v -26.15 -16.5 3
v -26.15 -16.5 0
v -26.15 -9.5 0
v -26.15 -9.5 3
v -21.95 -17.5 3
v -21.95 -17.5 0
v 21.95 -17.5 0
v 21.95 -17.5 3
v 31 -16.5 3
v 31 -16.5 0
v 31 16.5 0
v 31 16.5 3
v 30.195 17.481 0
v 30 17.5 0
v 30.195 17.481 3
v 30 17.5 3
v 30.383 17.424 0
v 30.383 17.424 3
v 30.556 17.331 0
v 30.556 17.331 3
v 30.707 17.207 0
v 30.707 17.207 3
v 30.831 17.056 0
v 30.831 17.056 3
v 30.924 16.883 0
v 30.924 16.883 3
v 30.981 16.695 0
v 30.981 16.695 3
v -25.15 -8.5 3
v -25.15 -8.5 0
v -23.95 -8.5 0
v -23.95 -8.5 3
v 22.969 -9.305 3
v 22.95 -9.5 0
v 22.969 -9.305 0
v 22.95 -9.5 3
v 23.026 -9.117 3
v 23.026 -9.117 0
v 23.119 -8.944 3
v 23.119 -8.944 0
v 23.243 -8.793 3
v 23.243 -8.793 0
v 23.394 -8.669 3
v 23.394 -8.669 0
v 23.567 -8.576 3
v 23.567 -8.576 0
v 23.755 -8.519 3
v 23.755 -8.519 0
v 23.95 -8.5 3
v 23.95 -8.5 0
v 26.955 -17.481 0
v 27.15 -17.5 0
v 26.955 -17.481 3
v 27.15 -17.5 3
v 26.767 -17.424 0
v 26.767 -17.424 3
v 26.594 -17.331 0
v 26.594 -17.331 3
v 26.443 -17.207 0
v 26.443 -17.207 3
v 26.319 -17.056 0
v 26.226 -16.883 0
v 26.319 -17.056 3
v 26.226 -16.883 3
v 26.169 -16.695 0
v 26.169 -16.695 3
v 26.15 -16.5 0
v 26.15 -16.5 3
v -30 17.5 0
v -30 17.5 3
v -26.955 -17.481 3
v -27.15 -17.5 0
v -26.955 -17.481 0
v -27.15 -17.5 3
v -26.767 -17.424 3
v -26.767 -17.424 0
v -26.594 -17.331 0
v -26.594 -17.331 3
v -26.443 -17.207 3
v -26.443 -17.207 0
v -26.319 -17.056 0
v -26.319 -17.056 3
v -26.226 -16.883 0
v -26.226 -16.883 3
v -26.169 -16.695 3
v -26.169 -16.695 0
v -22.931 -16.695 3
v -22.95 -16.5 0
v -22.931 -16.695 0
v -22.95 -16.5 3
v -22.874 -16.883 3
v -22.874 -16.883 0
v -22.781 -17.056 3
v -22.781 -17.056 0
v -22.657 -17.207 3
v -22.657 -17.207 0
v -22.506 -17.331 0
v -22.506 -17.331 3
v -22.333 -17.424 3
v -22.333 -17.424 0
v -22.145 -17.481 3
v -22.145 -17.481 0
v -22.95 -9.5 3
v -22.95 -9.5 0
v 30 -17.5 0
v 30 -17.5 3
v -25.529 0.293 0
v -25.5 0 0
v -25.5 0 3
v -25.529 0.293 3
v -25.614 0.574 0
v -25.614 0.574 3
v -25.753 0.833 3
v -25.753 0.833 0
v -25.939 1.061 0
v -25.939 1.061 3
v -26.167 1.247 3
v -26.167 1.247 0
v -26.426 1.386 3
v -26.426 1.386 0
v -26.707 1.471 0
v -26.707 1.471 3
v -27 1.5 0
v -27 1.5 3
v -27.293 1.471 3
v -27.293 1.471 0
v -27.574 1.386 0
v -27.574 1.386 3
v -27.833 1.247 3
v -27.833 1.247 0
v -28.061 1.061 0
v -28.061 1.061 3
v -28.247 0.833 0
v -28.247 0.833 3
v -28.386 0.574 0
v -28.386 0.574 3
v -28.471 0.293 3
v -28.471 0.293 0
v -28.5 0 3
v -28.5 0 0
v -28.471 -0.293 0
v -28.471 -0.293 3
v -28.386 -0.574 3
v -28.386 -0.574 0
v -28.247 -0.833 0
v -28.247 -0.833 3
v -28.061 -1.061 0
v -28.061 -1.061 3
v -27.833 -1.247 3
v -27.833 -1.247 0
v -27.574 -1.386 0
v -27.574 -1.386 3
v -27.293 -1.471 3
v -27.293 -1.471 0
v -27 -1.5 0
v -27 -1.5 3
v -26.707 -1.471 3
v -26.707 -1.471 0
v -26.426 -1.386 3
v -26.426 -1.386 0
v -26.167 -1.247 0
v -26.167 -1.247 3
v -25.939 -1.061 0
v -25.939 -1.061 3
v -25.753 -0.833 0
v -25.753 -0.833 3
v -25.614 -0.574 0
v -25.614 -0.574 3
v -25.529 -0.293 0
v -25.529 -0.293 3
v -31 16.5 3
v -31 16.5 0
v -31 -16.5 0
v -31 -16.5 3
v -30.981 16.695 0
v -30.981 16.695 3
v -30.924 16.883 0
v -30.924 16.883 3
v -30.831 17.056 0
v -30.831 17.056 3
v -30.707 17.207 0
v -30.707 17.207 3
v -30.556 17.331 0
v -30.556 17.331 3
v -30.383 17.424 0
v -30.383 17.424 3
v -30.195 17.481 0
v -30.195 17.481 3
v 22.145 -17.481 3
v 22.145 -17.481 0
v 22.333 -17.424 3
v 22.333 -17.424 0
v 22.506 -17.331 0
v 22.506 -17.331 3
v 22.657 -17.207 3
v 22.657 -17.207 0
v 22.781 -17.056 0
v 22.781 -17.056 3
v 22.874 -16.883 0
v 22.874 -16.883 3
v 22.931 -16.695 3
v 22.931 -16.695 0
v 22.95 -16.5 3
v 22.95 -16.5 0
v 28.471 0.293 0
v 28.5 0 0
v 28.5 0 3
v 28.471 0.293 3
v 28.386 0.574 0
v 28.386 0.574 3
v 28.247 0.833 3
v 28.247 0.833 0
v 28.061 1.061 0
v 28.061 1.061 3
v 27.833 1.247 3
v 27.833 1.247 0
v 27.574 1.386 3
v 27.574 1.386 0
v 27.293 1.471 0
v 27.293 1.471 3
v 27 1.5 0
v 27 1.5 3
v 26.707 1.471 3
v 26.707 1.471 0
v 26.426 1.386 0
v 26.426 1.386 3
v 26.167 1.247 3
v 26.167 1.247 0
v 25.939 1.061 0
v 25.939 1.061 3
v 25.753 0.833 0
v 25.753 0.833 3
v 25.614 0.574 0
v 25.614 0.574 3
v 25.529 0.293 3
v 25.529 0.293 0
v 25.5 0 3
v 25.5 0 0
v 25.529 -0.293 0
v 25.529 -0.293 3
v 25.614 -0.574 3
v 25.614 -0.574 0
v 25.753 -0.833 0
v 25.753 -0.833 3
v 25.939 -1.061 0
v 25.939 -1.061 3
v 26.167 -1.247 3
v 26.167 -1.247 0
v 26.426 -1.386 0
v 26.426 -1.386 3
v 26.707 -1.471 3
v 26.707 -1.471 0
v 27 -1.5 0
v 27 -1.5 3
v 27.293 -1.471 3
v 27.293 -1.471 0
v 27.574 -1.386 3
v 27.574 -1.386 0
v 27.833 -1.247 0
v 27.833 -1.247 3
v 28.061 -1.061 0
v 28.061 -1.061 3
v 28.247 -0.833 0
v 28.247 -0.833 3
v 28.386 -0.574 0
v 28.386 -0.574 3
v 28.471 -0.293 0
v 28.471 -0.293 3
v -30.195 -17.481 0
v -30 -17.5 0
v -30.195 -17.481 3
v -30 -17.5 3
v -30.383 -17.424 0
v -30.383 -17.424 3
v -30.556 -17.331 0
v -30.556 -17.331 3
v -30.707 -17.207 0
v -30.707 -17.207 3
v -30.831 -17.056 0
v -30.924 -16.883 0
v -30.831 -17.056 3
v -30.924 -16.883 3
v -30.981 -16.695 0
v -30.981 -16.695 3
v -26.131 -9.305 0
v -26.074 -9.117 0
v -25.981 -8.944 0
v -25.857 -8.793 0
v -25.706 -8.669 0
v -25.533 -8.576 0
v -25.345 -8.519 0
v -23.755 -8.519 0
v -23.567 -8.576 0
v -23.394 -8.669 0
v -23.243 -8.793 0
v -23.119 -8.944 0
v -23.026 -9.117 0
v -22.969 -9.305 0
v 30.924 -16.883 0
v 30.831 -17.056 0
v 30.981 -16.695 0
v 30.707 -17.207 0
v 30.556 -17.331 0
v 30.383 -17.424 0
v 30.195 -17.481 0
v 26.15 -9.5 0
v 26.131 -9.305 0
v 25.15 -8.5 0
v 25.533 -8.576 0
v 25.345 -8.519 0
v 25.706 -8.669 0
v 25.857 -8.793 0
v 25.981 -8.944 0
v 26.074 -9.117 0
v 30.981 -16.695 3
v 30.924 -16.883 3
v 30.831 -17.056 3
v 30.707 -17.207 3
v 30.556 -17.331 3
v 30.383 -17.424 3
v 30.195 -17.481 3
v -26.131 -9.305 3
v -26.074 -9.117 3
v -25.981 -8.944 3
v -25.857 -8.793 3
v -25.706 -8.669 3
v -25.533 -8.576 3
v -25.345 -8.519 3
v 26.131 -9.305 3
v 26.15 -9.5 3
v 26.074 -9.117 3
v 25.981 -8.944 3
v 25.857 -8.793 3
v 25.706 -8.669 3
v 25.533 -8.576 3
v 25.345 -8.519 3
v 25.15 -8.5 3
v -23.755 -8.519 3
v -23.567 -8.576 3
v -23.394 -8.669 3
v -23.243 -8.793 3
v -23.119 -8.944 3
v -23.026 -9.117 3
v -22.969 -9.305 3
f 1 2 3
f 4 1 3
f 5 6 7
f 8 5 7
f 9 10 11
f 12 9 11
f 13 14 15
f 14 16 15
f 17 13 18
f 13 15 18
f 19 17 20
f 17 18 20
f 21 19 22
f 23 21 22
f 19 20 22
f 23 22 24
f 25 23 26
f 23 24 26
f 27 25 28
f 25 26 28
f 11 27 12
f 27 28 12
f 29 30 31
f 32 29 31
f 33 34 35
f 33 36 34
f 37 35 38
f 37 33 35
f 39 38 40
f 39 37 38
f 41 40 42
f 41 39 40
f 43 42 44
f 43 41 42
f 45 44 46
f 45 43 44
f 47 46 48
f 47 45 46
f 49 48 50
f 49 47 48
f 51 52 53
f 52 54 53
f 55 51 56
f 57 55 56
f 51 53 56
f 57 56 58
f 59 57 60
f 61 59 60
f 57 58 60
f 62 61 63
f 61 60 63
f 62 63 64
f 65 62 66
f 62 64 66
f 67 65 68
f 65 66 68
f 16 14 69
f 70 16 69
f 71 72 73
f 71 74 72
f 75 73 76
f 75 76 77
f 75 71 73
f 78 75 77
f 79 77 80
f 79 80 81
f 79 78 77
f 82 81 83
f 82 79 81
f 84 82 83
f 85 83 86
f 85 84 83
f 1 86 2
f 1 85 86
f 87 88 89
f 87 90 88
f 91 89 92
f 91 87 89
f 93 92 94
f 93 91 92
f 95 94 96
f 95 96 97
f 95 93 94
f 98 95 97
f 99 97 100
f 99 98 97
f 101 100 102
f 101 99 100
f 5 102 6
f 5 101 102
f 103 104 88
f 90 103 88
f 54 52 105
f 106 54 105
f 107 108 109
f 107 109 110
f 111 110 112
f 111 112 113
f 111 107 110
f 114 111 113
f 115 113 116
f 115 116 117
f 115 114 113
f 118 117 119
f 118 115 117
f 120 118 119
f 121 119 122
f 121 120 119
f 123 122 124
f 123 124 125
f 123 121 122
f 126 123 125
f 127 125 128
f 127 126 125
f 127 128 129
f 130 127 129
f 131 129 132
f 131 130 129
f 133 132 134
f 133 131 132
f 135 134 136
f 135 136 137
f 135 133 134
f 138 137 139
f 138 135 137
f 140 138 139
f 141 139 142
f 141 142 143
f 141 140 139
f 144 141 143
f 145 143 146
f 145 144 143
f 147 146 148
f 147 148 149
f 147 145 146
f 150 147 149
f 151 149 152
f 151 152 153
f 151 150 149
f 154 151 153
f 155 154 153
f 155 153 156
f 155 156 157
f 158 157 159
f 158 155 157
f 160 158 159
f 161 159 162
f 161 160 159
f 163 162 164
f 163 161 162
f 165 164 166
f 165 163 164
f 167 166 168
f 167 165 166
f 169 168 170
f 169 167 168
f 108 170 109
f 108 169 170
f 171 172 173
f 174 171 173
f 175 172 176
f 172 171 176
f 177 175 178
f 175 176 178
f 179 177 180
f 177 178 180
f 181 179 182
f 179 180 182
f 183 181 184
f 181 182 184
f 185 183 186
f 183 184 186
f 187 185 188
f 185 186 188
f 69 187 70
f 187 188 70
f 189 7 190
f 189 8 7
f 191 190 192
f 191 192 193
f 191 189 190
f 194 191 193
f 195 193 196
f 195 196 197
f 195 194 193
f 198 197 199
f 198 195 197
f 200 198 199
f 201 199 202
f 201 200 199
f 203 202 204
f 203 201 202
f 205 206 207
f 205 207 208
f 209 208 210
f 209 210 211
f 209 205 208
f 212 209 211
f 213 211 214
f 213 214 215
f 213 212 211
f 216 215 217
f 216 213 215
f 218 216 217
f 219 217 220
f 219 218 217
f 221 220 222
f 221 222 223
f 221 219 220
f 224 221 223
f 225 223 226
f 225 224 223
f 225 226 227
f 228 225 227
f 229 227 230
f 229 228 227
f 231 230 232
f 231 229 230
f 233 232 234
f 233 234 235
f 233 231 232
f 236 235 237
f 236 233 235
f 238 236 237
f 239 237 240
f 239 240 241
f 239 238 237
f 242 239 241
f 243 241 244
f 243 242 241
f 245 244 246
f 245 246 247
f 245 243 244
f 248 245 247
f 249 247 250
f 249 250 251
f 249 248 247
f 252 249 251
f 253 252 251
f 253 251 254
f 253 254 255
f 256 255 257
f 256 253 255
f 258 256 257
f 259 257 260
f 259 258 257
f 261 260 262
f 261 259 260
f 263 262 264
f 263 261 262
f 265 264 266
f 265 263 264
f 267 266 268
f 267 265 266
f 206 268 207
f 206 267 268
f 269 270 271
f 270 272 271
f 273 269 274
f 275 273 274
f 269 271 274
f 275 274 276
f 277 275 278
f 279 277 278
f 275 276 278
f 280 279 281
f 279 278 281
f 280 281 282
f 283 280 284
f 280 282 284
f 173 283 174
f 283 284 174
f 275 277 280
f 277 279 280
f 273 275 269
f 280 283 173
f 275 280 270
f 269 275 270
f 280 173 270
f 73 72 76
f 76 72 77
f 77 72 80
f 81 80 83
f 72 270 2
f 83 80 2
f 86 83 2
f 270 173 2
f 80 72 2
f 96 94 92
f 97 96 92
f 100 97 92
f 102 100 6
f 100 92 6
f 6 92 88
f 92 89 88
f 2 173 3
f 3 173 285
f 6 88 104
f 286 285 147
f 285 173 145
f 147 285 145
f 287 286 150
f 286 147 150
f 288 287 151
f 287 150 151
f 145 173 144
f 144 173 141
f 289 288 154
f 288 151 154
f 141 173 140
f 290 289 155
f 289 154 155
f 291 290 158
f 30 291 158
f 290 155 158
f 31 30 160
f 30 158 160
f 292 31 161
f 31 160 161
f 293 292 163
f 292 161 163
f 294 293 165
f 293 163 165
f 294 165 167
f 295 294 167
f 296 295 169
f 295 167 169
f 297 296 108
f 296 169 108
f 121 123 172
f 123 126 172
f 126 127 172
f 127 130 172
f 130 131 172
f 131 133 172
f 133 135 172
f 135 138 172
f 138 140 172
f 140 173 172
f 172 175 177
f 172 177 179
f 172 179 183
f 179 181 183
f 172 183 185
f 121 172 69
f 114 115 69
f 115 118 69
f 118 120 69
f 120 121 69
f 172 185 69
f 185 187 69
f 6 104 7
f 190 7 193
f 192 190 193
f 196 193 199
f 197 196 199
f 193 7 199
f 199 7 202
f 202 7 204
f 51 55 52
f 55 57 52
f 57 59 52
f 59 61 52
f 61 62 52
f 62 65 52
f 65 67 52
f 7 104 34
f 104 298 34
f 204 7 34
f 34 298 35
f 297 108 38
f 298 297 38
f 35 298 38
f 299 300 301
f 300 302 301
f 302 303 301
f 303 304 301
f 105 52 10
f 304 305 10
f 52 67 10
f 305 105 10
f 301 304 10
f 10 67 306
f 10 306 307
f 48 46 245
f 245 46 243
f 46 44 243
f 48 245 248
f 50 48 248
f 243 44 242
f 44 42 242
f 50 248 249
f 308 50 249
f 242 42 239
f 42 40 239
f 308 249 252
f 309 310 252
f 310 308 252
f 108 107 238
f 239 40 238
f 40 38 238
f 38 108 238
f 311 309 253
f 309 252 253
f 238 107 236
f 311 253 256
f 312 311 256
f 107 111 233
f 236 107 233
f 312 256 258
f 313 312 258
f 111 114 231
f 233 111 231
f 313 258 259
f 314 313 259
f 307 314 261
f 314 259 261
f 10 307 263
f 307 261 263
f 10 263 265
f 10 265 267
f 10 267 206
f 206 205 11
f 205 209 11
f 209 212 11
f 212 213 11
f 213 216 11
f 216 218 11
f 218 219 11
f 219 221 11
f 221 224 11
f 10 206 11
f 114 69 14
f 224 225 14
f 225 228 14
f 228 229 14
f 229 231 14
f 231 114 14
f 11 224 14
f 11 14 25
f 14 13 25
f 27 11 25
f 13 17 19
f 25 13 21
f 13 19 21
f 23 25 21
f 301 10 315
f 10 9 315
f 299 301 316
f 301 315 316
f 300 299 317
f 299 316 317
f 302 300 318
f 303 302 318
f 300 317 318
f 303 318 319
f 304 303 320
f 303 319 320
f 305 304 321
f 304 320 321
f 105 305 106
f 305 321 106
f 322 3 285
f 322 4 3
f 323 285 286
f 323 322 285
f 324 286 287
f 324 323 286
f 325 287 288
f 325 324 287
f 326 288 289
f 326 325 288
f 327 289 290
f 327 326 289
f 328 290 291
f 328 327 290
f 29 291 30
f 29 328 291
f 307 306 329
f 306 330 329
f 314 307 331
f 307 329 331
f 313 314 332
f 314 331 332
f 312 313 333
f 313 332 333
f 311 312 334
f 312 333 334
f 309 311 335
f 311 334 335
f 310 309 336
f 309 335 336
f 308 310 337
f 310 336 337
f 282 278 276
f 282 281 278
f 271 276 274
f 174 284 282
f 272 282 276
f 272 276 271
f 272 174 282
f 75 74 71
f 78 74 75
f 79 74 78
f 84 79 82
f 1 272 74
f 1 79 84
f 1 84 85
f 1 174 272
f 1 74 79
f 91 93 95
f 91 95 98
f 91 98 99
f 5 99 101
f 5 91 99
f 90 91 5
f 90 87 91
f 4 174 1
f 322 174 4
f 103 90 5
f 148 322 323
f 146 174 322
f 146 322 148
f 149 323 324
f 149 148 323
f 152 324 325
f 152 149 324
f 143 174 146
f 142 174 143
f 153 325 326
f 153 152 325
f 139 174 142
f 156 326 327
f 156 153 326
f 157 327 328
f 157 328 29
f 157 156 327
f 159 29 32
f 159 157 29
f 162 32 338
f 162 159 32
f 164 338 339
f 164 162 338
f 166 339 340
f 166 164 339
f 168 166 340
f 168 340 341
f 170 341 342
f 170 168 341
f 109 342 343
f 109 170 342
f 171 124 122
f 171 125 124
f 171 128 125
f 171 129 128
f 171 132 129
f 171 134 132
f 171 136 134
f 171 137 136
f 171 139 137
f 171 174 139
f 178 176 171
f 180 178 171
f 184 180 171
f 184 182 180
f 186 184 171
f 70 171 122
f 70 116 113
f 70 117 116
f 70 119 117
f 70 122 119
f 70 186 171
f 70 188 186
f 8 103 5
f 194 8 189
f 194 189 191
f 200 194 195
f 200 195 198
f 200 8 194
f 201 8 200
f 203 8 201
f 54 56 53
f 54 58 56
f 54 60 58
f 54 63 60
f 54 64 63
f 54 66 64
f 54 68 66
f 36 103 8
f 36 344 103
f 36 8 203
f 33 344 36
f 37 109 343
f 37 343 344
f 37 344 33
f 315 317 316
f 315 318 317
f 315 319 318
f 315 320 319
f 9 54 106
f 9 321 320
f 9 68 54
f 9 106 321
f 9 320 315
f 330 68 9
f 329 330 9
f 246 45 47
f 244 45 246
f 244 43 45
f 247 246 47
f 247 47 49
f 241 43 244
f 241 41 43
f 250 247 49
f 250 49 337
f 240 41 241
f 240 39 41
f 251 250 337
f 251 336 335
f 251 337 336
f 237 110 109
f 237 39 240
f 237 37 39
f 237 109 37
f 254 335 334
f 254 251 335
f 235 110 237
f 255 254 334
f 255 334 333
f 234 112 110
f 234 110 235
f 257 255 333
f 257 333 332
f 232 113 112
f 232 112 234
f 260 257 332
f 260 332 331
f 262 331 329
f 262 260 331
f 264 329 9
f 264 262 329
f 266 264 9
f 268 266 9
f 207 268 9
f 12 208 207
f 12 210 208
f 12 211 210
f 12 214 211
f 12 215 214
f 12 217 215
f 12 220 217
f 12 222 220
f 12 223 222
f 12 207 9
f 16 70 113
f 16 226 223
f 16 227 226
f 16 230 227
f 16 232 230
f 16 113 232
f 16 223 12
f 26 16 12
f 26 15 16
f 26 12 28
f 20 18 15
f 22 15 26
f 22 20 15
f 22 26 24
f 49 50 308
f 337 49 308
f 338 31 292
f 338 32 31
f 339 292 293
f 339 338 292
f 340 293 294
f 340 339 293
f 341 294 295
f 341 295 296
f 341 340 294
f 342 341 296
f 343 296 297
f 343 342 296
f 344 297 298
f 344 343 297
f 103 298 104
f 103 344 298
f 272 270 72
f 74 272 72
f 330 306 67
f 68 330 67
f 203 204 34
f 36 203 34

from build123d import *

# Parameters (mm, degrees)
SKETCH_1_R      = 1.5
EXTRUDE_1_DEPTH = 3
FILLET_1_R      = 1


with BuildPart() as part:
    # 草图1 → 凸台-拉伸1 (new body)
    with BuildSketch(Plane.XY):
        Polygon((-31, -17.5), (-26.15, -17.5), (-26.15, -8.5), (-22.95, -8.5), (-22.95, -17.5), (22.95, -17.5), (22.95, -8.5), (26.15, -8.5), (26.15, -17.5), (31, -17.5), (31, 17.5), (-31, 17.5), align=None)
        with Locations((-27, 0)):
            Circle(SKETCH_1_R, mode=Mode.SUBTRACT)
        with Locations((27, 0)):
            Circle(SKETCH_1_R, mode=Mode.SUBTRACT)
    extrude(amount=EXTRUDE_1_DEPTH)

    # 圆角1
    fillet_1_edges = [part.edges().sort_by_distance(p)[0] for p in [
        (31, -17.5, 1.5),
        (26.15, -17.5, 1.5),
        (26.15, -8.5, 1.5),
        (22.95, -8.5, 1.5),
        (22.95, -17.5, 1.5),
        (-22.95, -17.5, 1.5),
        (-22.95, -8.5, 1.5),
        (-26.15, -8.5, 1.5),
        (-26.15, -17.5, 1.5),
        (-31, -17.5, 1.5),
        (-31, 17.5, 1.5),
        (31, 17.5, 1.5),
    ]]
    fillet(fillet_1_edges, radius=FILLET_1_R)


solid = part.part
